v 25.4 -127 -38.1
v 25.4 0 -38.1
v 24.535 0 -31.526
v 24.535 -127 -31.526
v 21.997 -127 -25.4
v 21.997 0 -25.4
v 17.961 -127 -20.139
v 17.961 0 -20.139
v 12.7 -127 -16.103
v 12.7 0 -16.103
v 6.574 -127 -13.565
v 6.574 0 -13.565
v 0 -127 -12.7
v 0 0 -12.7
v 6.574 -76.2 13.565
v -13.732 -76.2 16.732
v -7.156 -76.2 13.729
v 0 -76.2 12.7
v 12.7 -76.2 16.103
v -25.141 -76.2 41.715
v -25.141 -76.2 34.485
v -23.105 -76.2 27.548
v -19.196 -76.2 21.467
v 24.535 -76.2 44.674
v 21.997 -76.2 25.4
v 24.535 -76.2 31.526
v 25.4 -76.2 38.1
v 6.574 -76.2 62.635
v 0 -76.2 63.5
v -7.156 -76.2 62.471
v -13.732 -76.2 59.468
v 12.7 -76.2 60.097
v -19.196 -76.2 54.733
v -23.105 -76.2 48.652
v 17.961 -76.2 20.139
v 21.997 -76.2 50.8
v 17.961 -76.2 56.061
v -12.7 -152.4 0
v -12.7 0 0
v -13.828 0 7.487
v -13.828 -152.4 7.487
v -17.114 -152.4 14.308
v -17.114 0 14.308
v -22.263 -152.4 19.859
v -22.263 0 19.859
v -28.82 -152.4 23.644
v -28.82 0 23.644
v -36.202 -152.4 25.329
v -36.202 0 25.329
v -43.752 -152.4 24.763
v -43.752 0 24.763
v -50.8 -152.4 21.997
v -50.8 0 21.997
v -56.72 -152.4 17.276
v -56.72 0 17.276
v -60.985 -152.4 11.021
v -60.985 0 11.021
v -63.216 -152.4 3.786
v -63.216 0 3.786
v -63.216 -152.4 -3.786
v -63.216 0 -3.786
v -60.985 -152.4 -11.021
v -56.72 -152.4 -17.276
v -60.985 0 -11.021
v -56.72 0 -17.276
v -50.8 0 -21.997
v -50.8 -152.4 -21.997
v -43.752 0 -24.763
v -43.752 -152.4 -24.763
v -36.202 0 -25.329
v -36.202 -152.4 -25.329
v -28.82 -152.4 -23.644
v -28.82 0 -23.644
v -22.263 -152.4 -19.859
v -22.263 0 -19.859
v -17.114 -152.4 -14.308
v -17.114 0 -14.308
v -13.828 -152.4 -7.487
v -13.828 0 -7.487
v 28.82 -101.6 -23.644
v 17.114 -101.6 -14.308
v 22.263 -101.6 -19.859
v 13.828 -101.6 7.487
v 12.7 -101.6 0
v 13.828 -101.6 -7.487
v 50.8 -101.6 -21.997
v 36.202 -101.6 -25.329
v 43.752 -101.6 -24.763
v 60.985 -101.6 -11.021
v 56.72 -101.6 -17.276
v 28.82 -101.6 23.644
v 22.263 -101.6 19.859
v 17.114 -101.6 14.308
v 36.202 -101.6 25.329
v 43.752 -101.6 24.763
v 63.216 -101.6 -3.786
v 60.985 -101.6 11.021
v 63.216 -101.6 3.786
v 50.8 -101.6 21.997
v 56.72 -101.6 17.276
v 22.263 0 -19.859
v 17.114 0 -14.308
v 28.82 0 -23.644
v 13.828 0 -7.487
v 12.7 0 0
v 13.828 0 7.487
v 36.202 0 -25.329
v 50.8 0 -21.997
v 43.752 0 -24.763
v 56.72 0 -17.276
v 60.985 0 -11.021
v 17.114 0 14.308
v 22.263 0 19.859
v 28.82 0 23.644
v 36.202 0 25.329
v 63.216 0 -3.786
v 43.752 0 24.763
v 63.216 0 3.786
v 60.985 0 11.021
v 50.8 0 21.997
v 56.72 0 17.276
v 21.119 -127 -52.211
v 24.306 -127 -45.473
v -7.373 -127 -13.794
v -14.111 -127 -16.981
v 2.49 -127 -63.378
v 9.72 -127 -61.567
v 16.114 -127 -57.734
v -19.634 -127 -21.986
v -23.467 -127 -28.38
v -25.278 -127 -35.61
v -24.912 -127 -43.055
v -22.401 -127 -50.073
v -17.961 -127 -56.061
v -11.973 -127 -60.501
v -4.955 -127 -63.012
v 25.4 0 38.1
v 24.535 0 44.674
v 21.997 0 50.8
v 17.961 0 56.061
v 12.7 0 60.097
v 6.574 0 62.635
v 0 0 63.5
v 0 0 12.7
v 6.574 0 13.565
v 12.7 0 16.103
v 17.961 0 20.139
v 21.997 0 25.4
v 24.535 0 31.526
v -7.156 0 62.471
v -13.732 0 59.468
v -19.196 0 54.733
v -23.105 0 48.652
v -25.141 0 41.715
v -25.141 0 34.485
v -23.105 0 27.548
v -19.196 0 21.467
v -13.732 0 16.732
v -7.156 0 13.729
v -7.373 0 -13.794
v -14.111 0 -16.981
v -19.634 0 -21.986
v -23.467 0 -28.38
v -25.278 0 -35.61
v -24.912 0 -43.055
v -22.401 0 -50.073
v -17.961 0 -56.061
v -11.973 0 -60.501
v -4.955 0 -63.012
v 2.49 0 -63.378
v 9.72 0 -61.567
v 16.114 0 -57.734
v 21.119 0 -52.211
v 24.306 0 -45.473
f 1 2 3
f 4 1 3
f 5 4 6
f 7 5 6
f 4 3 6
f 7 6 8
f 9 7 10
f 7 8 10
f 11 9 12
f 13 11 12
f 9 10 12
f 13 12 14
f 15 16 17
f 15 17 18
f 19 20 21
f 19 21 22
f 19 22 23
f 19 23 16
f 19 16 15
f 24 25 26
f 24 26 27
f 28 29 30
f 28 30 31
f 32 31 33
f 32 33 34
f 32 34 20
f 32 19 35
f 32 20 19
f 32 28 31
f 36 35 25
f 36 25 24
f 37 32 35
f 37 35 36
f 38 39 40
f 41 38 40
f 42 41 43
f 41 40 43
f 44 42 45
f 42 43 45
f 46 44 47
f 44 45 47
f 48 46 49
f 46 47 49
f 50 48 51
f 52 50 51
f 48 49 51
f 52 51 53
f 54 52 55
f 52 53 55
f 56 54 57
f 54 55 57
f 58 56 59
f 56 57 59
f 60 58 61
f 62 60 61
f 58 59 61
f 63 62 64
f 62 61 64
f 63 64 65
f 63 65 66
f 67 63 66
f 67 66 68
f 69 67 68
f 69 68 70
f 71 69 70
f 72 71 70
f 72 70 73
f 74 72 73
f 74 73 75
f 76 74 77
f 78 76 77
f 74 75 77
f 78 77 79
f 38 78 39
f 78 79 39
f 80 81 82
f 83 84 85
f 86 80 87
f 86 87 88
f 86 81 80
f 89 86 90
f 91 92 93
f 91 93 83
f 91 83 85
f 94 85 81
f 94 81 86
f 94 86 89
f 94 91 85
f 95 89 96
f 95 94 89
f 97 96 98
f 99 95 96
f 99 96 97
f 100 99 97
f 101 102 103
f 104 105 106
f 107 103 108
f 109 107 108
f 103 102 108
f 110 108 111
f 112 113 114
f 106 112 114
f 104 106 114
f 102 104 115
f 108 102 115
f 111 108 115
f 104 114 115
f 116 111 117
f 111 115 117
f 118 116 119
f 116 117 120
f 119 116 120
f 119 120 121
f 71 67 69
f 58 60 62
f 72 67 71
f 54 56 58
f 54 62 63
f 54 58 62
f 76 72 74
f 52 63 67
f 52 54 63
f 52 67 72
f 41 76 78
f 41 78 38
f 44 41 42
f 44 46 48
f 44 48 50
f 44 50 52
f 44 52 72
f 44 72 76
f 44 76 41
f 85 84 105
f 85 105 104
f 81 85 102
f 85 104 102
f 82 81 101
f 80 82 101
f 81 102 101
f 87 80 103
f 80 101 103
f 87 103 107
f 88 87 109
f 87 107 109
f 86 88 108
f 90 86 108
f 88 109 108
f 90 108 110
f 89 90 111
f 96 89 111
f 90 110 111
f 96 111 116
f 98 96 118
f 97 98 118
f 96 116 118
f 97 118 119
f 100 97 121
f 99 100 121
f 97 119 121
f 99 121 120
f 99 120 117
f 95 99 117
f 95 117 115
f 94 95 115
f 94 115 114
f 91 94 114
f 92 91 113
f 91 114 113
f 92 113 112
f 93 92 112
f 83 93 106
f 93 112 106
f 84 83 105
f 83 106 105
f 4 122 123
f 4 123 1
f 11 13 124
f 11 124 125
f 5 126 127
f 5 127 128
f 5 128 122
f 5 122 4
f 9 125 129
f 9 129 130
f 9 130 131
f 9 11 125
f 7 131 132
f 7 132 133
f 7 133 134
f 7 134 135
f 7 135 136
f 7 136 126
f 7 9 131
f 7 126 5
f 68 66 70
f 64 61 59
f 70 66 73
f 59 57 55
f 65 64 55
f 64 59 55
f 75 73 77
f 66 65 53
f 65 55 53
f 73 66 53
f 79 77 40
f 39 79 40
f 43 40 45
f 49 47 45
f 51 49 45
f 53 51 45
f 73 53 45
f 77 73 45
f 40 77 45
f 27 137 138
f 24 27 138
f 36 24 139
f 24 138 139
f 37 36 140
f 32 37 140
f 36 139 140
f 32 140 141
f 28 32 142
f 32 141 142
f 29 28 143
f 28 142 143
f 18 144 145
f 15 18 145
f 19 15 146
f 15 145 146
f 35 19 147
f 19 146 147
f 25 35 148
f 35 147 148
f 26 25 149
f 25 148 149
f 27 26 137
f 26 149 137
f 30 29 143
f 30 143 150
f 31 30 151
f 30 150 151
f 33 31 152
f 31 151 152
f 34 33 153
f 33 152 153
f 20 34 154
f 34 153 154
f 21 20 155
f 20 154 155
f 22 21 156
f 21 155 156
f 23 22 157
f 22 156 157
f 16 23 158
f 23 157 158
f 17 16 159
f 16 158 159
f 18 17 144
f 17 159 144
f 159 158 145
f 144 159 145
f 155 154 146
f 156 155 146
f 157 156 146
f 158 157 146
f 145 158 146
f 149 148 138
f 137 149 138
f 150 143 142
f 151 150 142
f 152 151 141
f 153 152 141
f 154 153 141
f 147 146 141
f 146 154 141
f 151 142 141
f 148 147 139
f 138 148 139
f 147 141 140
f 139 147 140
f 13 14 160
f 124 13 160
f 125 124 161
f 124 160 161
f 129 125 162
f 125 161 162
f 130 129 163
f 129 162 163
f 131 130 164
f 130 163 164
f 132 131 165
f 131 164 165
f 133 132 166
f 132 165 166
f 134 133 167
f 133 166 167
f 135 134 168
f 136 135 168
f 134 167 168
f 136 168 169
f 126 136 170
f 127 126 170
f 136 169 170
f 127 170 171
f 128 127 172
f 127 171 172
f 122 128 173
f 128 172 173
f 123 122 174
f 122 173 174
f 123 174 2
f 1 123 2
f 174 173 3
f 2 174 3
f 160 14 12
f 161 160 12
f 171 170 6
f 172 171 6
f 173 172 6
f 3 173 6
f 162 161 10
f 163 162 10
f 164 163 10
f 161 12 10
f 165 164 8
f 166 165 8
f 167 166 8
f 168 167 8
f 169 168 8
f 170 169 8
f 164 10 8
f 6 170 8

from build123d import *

# Parameters (mm, degrees)
F1_DEPTH = 76.2
F4_DEPTH = 127
F5_R     = 25.4
F6_DEPTH = 152.4
F7_DEPTH = 101.6


# Not quite as in the source:
# - the program builds the solid bodies; features that only make, move or delete a surface that nothing else refers to are left out


with BuildPart() as f1:
    # F0 (on Front) → F1 (new body)
    with BuildSketch(Plane.XZ):
        with BuildLine():
            ThreePointArc((25.4, 38.1), (17.9605122421, 56.0605122421), (0, 63.5))
            ThreePointArc((0, 63.5), (-25.4, 38.1), (0, 12.7))
            ThreePointArc((0, 12.7), (17.9605122421, 20.1394877579), (25.4, 38.1))
        make_face()
    extrude(amount=F1_DEPTH)


with BuildPart() as f4:
    # F3 (on Front) → F4 (new body)
    with BuildSketch(Plane.XZ):
        with BuildLine():
            ThreePointArc((0, -12.7), (-17.9605122421, -56.0605122421), (25.4, -38.1))
            ThreePointArc((25.4, -38.1), (17.9605122421, -20.1394877579), (0, -12.7))
        make_face()
    extrude(amount=F4_DEPTH)


with BuildPart() as f6:
    # F5 (on Front) → F6 (new body)
    with BuildSketch(Plane.XZ):
        with Locations((-38.1, 0)):
            Circle(F5_R)
    extrude(amount=F6_DEPTH)


with BuildPart() as f7:
    # F5 (on Front) → F7 (new body)
    with BuildSketch(Plane.XZ):
        with BuildLine():
            ThreePointArc((63.5, 0), (38.1, 25.4), (12.7, 0))
            ThreePointArc((12.7, 0), (38.1, -25.4), (63.5, 0))
        make_face()
    extrude(amount=F7_DEPTH)


solid = Compound([f1.part, f4.part, f6.part, f7.part])
